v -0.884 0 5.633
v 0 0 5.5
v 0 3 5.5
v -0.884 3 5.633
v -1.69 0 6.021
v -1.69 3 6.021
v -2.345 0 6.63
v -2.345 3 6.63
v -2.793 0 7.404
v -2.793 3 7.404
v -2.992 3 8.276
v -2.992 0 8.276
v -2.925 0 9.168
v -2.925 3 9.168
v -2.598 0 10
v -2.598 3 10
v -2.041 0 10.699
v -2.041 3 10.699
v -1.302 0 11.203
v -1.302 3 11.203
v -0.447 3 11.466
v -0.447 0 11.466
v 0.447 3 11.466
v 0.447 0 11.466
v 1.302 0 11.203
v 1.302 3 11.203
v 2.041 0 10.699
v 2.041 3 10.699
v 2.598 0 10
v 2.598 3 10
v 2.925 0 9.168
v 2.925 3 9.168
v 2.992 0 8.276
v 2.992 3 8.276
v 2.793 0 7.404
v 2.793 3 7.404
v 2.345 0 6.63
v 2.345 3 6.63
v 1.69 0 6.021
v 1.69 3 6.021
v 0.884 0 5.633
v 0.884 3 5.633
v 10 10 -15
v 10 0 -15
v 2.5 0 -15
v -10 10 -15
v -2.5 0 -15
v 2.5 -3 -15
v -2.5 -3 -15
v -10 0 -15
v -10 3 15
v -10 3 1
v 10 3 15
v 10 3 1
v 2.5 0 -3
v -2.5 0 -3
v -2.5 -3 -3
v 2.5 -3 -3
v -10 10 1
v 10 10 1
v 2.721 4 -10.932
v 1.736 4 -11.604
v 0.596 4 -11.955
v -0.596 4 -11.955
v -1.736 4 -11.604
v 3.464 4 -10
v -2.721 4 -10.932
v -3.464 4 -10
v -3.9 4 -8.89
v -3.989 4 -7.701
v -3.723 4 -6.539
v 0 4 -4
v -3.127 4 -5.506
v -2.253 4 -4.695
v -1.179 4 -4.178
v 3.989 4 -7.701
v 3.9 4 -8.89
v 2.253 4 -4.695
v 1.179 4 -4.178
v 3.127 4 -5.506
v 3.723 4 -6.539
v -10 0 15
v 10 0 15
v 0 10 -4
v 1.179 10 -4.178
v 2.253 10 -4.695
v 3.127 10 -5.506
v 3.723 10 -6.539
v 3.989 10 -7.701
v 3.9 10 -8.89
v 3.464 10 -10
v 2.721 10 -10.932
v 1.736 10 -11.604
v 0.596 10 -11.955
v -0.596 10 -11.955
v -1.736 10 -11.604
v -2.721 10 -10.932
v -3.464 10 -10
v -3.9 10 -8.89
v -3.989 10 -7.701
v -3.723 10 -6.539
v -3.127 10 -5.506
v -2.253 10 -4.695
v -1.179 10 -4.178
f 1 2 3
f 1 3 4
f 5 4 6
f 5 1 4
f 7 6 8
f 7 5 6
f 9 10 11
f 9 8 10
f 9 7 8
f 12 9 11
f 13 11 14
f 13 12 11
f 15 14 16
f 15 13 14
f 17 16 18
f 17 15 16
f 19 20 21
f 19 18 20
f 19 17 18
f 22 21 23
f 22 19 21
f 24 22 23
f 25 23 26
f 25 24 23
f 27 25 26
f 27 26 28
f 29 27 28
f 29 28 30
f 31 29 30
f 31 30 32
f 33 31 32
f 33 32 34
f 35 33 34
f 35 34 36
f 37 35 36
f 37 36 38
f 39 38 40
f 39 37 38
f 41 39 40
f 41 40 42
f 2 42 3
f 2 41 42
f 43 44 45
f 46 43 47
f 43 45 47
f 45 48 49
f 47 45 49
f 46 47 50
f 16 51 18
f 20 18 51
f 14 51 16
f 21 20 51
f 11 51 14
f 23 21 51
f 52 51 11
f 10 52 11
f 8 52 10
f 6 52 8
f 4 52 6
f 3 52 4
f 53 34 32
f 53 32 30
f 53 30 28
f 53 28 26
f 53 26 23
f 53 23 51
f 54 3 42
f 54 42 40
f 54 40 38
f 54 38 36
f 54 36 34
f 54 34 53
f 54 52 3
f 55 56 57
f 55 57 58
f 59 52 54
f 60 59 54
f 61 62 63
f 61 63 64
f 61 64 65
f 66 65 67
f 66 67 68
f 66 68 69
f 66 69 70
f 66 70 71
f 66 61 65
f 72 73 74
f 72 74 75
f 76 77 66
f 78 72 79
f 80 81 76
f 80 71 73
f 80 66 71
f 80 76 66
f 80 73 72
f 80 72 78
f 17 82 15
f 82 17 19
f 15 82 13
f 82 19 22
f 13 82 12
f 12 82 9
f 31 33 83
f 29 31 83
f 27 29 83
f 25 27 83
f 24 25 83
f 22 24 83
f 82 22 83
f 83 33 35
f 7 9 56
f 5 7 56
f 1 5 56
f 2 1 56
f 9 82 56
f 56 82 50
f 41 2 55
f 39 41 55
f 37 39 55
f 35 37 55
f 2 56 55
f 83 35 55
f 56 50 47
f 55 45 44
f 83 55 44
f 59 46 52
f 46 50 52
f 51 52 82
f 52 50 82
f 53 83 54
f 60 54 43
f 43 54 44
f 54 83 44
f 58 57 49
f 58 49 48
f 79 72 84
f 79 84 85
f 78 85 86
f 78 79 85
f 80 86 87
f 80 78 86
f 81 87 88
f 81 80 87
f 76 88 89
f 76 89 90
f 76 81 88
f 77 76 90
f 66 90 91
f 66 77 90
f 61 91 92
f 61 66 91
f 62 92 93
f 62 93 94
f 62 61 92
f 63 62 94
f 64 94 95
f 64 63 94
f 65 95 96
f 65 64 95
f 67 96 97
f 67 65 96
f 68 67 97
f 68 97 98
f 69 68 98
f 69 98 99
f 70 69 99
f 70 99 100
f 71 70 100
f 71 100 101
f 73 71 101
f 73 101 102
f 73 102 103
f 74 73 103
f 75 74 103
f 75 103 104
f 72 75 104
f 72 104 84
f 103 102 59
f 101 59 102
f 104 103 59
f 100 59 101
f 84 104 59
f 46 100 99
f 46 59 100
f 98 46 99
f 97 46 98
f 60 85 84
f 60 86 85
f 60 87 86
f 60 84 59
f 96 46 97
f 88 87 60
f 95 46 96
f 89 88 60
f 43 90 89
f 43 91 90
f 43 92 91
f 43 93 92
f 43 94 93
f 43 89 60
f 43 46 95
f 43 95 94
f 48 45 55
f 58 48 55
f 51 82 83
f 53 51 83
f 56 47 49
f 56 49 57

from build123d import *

# Parameters (mm, degrees)
SKETCH1_W               = 20
SKETCH1_H               = 30
BOSS_EXTRUDE1_DEPTH     = 3
SKETCH2_W               = 5
SKETCH2_H               = 12
BOSS_EXTRUDE2_DEPTH     = 3
SKETCH3_R               = 7
SKETCH3_R_2             = 4
BOSS_EXTRUDE3_DEPTH     = 7
SKETCH4_R               = 4
BOSS_EXTRUDE4_DEPTH     = 1
CUT_EXTRUDE1_DEPTH      = 20.339079606
CUT_EXTRUDE1_DEPTH_BACK = 20.339079606
SKETCH5_R               = 3
SKETCH6_R               = 7
SKETCH6_R_2             = 4
BOSS_EXTRUDE6_DEPTH     = 7


with BuildPart() as part:
    # Sketch1 → Boss-Extrude1 (new body)
    with BuildSketch(Plane(origin=(0, 0, 0), x_dir=(1, 0, 0), z_dir=(0, 1, 0))):
        Rectangle(SKETCH1_W, SKETCH1_H)
    extrude(amount=BOSS_EXTRUDE1_DEPTH)

    # Sketch2 → Boss-Extrude2 (add)
    with BuildSketch(Plane.XZ):
        with Locations((0, -9)):
            Rectangle(SKETCH2_W, SKETCH2_H)
    extrude(amount=BOSS_EXTRUDE2_DEPTH)

    # Sketch3 → Boss-Extrude3 (add)
    with BuildSketch(Plane(origin=(0, 3, 0), x_dir=(1, 0, 0), z_dir=(0, 1, 0))):
        with Locations(Location((0, 8, 0), (0, 0, 90))):
            Circle(SKETCH3_R)
        with Locations(Location((0, 8, 0), (0, 0, 270))):
            Circle(SKETCH3_R_2, mode=Mode.SUBTRACT)
    extrude(amount=BOSS_EXTRUDE3_DEPTH)

    # Sketch4 → Boss-Extrude4 (add)
    with BuildSketch(Plane(origin=(0, 3, 0), x_dir=(1, 0, 0), z_dir=(0, 1, 0))):
        with Locations(Location((0, 8, 0), (0, 0, 270))):
            Circle(SKETCH4_R)
    extrude(amount=BOSS_EXTRUDE4_DEPTH)

    # Sketch5 → Cut-Extrude1 (cut, two sides: drawn at the far end of the back side and taken through both)
    with BuildSketch(Plane(origin=(0, 3, 0), x_dir=(1, 0, 0), z_dir=(0, 1, 0)).offset(-CUT_EXTRUDE1_DEPTH_BACK)):
        with Locations(Location((0, -8.5, 0), (0, 0, 90))):
            Circle(SKETCH5_R)
    extrude(amount=CUT_EXTRUDE1_DEPTH + CUT_EXTRUDE1_DEPTH_BACK, mode=Mode.SUBTRACT)

    # Sketch6 → Boss-Extrude6 (add)
    # profile 1 of 2: a face of its own
    with BuildSketch(Plane(origin=(0, 3, 0), x_dir=(1, 0, 0), z_dir=(0, 1, 0))):
        Polygon((0, 15), (-10, 15), (-10, -1), (10, -1), (10, 15), align=None)
        with BuildLine():
            ThreePointArc((7, 8), (-4.949747468, 3.050252532), (0, 15))
            ThreePointArc((0, 15), (4.949747468, 12.949747468), (7, 8))
        make_face(mode=Mode.SUBTRACT)
    # profile 2 of 2: a face of its own
    with BuildSketch(Plane(origin=(0, 3, 0), x_dir=(1, 0, 0), z_dir=(0, 1, 0))):
        with Locations((0, 8)):
            Circle(SKETCH6_R)
        with Locations(Location((0, 8, 0), (0, 0, 270))):
            Circle(SKETCH6_R_2, mode=Mode.SUBTRACT)
    extrude(amount=BOSS_EXTRUDE6_DEPTH)


solid = part.part
